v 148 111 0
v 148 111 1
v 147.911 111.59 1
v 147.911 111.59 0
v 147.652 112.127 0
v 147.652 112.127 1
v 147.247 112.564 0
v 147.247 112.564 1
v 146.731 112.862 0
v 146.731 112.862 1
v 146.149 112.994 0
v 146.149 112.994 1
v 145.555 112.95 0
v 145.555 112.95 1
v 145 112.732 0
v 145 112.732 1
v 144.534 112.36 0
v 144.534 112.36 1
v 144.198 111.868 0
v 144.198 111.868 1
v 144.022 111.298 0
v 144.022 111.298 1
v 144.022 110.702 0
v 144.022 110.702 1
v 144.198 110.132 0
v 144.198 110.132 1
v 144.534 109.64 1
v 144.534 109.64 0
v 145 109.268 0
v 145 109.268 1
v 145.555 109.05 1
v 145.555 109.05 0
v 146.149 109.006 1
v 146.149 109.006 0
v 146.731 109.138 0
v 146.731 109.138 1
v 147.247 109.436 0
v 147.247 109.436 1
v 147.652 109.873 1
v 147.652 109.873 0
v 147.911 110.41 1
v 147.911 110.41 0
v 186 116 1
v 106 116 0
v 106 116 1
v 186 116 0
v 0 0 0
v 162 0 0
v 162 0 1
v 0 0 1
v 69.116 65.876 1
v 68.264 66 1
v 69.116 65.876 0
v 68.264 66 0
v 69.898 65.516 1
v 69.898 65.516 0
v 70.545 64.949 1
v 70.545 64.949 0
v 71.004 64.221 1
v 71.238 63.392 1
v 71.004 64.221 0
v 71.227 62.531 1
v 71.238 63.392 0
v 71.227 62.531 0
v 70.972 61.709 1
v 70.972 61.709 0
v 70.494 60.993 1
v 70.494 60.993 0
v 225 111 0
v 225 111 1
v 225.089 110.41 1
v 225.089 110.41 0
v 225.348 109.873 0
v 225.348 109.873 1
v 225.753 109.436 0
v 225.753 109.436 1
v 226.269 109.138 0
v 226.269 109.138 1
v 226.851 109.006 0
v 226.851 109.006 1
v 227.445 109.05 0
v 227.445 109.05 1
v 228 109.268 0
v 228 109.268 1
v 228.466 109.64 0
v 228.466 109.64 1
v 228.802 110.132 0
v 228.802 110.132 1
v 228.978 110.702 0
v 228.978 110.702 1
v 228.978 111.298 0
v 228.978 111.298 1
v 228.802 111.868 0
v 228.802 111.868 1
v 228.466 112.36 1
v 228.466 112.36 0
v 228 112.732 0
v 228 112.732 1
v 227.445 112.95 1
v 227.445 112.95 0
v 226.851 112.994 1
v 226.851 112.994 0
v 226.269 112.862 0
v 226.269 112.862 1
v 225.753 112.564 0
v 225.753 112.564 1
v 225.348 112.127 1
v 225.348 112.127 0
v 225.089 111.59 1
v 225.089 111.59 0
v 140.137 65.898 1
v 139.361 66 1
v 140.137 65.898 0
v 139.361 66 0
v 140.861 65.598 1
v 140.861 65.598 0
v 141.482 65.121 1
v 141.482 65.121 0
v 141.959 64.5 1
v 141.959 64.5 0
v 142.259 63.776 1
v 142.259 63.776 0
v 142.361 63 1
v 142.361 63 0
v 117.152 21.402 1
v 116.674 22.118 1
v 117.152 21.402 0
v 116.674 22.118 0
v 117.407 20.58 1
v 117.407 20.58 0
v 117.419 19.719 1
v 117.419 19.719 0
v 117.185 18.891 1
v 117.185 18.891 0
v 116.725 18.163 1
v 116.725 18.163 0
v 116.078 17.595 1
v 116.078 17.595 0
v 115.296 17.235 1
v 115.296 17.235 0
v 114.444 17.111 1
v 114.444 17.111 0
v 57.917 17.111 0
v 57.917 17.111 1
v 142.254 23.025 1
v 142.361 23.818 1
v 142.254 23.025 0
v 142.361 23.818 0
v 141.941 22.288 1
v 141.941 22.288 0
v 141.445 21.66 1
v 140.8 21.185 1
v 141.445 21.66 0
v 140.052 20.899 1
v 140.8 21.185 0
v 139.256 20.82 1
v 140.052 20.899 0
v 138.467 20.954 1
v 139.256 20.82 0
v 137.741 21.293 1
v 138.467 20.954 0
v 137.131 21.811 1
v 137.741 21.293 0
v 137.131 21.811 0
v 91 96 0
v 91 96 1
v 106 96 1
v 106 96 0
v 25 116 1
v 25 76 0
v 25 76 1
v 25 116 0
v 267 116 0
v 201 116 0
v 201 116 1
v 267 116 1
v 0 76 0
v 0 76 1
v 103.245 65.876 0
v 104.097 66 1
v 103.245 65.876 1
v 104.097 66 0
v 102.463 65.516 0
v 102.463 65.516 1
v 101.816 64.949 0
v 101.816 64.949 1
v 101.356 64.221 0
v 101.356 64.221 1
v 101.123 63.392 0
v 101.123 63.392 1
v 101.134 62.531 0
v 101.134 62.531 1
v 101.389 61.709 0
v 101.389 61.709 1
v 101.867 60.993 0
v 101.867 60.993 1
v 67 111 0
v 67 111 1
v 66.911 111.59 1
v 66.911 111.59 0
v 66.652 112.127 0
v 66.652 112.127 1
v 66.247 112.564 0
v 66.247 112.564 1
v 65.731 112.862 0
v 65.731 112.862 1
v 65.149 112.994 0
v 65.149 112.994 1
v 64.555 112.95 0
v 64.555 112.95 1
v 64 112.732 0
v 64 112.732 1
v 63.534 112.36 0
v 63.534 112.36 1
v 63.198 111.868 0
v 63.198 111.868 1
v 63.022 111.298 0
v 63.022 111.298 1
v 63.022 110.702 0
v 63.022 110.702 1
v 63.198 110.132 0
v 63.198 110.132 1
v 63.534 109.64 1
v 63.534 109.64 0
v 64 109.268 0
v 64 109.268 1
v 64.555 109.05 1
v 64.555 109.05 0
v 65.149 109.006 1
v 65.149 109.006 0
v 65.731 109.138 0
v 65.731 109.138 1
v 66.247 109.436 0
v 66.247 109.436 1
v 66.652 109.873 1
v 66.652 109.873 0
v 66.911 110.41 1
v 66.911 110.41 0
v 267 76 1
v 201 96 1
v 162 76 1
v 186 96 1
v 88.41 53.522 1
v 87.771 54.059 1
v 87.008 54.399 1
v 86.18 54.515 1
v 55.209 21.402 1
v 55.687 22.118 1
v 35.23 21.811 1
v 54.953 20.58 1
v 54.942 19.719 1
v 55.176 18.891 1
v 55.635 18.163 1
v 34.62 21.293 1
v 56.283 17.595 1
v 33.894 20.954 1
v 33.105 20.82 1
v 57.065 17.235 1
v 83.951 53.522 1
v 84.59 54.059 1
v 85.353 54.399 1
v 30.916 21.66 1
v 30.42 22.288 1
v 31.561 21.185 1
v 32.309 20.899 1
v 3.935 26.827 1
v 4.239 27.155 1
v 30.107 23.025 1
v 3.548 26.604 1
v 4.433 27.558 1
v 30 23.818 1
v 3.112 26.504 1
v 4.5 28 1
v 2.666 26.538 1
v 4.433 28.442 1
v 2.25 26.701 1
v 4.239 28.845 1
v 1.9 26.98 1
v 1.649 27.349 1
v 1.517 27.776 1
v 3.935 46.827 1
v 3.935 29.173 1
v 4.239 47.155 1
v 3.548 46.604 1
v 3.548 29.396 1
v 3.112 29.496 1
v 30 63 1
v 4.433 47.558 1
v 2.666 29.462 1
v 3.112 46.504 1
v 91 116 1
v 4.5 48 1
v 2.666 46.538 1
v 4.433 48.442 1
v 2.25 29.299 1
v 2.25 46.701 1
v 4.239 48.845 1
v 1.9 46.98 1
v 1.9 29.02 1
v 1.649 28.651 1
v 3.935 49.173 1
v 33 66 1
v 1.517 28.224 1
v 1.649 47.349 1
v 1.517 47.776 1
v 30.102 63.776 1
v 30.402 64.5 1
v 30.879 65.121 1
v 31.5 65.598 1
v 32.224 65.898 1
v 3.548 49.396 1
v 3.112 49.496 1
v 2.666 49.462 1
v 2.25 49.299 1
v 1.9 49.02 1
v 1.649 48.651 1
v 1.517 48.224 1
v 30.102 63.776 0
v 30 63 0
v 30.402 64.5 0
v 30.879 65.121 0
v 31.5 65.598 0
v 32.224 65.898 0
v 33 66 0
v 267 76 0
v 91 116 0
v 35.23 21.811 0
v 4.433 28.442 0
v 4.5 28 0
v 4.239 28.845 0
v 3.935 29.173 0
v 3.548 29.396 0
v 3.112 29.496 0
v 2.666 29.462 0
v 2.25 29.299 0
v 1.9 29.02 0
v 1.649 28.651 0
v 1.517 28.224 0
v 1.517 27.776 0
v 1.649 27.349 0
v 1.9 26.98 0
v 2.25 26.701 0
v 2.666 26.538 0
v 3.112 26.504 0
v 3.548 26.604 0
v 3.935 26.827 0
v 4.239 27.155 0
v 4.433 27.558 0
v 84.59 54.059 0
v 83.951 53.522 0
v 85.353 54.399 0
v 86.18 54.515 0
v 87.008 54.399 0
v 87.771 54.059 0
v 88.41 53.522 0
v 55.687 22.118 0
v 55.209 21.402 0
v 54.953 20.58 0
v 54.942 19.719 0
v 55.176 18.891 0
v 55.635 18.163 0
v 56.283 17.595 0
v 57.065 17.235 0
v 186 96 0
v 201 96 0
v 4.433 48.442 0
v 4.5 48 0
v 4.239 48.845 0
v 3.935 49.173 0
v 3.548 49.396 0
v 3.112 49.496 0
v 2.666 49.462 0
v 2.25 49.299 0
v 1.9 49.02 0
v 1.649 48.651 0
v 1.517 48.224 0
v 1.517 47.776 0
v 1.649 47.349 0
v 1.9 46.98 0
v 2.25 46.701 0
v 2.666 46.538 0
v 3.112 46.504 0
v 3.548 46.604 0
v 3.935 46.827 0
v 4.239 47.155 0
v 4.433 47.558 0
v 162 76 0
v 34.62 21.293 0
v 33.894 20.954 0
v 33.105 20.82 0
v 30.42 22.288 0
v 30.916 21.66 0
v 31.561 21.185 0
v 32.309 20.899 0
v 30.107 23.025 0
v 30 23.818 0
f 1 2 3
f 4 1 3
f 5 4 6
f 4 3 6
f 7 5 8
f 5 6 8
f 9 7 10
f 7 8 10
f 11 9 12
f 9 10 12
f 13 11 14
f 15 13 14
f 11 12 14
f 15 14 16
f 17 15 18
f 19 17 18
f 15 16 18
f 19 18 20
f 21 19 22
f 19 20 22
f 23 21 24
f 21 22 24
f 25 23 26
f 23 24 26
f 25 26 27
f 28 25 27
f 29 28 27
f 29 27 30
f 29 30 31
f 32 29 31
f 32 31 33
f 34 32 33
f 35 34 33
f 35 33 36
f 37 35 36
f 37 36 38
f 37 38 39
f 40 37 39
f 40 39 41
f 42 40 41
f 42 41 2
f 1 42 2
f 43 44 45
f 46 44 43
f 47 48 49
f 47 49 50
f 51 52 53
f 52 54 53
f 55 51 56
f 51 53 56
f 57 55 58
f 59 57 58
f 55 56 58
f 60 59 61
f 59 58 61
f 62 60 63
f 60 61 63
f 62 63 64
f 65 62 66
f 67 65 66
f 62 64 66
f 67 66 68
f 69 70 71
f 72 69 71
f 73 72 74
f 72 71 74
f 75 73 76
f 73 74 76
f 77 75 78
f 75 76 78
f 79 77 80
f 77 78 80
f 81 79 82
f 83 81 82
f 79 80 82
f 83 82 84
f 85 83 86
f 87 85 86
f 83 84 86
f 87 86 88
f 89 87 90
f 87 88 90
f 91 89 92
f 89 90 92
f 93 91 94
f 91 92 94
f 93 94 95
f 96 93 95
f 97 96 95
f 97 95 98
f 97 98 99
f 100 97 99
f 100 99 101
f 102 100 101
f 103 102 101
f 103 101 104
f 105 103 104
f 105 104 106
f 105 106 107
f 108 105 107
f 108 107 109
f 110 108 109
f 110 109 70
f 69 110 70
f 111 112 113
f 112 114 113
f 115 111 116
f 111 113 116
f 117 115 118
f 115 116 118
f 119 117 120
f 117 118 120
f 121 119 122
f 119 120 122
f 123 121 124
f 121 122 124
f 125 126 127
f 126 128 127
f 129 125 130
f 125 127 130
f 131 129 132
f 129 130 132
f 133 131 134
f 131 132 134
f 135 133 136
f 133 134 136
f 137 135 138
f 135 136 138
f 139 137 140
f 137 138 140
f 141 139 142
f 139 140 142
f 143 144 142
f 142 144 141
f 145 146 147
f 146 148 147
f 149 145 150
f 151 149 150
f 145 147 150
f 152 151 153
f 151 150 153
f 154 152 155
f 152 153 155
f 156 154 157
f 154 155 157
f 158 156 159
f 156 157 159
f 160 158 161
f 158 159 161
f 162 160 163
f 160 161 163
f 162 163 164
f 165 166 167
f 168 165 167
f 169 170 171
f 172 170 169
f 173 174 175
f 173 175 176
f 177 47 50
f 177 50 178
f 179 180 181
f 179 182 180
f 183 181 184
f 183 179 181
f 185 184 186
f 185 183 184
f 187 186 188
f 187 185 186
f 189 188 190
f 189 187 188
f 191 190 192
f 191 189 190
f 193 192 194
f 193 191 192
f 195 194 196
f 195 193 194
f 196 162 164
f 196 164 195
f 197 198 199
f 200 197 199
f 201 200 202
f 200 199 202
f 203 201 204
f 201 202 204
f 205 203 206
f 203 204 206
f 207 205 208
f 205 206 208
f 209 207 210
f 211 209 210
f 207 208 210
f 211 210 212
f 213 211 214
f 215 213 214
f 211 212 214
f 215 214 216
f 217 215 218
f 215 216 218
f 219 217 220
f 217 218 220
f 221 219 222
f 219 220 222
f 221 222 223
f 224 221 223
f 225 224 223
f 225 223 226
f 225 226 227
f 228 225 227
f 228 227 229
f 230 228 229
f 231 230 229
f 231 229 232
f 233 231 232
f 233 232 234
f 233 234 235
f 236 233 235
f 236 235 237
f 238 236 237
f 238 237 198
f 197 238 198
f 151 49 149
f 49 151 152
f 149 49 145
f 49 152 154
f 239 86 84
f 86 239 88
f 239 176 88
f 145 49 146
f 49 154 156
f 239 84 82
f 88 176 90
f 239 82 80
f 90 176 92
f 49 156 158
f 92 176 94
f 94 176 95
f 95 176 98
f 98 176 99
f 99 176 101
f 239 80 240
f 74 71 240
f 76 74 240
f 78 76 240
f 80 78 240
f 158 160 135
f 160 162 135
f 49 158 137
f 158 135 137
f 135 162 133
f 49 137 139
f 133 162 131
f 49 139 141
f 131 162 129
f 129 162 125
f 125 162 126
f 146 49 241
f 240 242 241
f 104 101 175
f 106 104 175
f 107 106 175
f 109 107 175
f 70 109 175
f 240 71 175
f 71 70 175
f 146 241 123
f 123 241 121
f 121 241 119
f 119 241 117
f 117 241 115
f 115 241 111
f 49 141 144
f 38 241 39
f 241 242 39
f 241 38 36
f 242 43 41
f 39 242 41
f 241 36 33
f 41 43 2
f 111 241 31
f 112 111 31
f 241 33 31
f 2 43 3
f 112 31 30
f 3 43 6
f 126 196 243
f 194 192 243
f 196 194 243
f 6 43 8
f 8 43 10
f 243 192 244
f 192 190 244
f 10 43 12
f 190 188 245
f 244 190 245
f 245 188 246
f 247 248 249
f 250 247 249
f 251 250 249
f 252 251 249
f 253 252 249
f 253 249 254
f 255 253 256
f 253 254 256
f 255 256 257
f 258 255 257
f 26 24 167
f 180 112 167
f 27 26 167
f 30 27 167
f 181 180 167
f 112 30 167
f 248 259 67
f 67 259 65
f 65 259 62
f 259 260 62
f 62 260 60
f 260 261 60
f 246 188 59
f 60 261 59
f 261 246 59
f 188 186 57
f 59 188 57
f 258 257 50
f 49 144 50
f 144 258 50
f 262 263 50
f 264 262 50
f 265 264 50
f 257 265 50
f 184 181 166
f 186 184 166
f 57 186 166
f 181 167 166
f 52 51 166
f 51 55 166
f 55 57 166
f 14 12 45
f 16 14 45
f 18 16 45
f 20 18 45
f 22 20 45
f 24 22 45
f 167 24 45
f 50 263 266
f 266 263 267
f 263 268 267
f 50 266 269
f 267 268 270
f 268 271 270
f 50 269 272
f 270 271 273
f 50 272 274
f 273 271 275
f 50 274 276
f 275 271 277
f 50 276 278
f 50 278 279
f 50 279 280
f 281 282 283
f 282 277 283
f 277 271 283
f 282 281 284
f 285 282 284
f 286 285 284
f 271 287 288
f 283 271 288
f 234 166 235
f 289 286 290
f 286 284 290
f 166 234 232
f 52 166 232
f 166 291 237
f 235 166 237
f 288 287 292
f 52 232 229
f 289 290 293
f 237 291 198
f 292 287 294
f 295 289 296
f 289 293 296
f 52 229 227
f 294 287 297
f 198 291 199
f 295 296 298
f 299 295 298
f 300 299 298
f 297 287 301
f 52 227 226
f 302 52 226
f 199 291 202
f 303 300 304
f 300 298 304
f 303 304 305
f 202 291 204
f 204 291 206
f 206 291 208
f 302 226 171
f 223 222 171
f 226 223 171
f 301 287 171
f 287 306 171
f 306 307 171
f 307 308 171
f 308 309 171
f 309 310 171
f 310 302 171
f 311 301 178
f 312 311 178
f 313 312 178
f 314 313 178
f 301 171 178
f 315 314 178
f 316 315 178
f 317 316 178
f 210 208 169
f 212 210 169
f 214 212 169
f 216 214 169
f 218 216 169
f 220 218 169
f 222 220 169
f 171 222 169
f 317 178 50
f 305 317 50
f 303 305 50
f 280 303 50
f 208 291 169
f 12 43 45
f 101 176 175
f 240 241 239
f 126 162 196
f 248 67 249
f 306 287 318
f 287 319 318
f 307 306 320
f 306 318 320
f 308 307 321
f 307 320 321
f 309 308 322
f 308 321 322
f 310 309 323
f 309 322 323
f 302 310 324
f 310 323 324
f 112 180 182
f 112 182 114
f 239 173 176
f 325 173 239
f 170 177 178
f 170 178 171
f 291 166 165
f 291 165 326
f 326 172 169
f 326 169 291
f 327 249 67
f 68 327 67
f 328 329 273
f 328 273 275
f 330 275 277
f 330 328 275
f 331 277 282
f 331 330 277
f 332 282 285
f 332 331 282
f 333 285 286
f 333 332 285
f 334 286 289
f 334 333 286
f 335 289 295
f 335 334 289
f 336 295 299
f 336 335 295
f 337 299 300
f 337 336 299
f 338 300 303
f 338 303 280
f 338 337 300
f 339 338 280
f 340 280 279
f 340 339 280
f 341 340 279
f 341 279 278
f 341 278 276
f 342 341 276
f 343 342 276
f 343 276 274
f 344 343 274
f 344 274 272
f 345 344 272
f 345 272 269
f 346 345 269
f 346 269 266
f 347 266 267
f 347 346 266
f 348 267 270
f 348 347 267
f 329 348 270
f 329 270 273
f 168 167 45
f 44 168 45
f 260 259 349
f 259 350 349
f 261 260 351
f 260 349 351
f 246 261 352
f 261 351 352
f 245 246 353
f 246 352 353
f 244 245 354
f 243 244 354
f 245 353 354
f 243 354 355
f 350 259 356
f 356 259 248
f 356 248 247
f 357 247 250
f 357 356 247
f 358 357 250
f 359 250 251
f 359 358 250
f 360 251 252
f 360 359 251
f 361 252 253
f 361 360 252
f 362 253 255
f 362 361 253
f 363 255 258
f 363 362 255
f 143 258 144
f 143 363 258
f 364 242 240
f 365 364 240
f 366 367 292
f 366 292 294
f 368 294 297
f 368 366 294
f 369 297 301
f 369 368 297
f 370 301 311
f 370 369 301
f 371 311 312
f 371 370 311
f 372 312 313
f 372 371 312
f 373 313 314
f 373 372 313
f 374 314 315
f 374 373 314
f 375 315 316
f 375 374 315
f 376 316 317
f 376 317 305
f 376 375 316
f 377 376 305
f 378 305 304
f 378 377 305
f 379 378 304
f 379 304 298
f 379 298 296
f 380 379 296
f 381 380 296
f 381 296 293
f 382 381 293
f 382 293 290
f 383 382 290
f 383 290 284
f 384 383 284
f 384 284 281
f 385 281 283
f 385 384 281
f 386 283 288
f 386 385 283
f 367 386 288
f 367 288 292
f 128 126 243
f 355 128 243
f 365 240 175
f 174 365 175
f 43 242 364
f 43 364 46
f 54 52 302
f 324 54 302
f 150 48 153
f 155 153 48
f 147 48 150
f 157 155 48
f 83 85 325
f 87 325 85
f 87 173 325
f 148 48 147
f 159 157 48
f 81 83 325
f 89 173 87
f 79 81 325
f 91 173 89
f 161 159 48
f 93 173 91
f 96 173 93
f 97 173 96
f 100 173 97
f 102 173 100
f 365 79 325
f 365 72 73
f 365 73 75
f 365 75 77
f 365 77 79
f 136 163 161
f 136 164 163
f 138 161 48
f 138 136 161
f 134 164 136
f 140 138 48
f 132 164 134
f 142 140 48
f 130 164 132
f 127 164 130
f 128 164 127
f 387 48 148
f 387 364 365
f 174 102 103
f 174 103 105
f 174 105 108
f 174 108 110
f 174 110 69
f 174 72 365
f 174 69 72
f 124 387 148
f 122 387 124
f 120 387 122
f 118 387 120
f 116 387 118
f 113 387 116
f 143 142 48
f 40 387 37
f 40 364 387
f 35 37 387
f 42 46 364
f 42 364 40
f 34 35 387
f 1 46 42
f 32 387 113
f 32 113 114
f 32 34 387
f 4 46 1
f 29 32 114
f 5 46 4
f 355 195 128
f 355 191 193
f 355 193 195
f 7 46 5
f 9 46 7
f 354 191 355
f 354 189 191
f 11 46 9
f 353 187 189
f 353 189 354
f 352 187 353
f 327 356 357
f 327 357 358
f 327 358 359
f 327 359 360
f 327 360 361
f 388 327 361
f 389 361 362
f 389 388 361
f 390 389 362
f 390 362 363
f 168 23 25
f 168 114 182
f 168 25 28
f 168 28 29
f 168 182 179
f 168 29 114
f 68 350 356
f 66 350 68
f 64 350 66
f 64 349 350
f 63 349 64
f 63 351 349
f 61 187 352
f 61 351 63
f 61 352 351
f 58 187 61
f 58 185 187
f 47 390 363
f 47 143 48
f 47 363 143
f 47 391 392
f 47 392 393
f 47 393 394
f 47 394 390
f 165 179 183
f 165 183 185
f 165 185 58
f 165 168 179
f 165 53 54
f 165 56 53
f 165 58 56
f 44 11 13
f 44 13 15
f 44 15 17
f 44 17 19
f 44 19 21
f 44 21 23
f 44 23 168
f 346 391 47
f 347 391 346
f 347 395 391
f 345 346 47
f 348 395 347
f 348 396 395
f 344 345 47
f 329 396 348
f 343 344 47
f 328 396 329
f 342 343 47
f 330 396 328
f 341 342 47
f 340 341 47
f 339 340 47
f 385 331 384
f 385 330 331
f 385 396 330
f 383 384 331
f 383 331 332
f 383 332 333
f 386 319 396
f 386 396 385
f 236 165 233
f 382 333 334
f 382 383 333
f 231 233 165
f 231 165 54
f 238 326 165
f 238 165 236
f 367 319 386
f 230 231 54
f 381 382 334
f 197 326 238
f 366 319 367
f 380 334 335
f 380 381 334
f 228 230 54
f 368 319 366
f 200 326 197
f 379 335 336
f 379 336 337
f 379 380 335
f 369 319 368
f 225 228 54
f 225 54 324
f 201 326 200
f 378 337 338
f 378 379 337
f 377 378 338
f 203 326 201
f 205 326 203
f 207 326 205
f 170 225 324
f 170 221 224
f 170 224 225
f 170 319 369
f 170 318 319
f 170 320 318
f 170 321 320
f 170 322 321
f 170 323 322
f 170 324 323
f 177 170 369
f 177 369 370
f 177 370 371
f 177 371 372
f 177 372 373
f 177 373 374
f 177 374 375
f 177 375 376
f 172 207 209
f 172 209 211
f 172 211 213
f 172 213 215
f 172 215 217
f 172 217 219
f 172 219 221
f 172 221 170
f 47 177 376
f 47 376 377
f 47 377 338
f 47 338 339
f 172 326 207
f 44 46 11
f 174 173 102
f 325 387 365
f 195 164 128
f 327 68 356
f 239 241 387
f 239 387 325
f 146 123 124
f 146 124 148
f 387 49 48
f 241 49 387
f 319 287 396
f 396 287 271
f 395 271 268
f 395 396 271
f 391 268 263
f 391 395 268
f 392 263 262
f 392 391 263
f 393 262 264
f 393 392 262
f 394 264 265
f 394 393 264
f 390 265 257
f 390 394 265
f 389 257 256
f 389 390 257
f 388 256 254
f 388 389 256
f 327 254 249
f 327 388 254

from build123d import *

# Parameters (mm, degrees)
SKETCH_1_R          = 1.5
EXTRUDE_1_DEPTH     = 1
SKETCH_2_R          = 2
SKETCH_2_W          = 15
SKETCH_2_H          = 20
CUT_EXTRUDE_1_DEPTH = 315.198981539
SKETCH_3_W          = 130
SKETCH_3_H          = 76
CUT_EXTRUDE_2_DEPTH = 315.198981539
CUT_EXTRUDE_3_REACH = 293.112
FILLET_1_R          = 3


with BuildPart() as part:
    # 草图1 → 凸台-拉伸1 (new body)
    with BuildSketch(Plane.XY):
        Polygon((0, 0), (0, 76), (25, 76), (25, 116), (267, 116), (267, 76), (292, 76), (292, 0), align=None)
        with Locations((3, 48)):
            Circle(SKETCH_1_R, mode=Mode.SUBTRACT)
        with Locations((3, 28)):
            Circle(SKETCH_1_R, mode=Mode.SUBTRACT)
        with Locations(Location((289, 28, 0), (0, 0, 180))):
            Circle(SKETCH_1_R, mode=Mode.SUBTRACT)
        with Locations(Location((289, 48, 0), (0, 0, 180))):
            Circle(SKETCH_1_R, mode=Mode.SUBTRACT)
    extrude(amount=EXTRUDE_1_DEPTH)

    # 草图2 → 切除-拉伸1 (cut, through all)
    with BuildSketch(Plane.XY.offset(1)):
        with Locations((65, 111)):
            Circle(SKETCH_2_R)
        with Locations(Location((227, 111, 0), (0, 0, 180))):
            Circle(SKETCH_2_R)
        with Locations((146, 111)):
            Circle(SKETCH_2_R)
        with Locations((193.5, 106)):
            Rectangle(SKETCH_2_W, SKETCH_2_H)
        with Locations((98.5, 106)):
            Rectangle(SKETCH_2_W, SKETCH_2_H)
    extrude(amount=-CUT_EXTRUDE_1_DEPTH, mode=Mode.SUBTRACT)

    # 草图3 → 切除-拉伸2 (cut, through all)
    with BuildSketch(Plane.XY.offset(1)):
        with Locations((227, 38)):
            Rectangle(SKETCH_3_W, SKETCH_3_H)
    extrude(amount=-CUT_EXTRUDE_2_DEPTH, mode=Mode.SUBTRACT)

    # 草图4 → 切除-拉伸3 (cut, up to next)
    with BuildSketch(Plane.XY.offset(1), mode=Mode.PRIVATE) as cut_extrude_3_sk1:
        Polygon((30, 16), (75, 66), (30, 66), align=None)
    cut_extrude_3_tool1 = extrude(cut_extrude_3_sk1.sketch, amount=-CUT_EXTRUDE_3_REACH, mode=Mode.PRIVATE) & part.part
    # 草图4 → 切除-拉伸3 (cut, up to next)
    with BuildSketch(Plane.XY.offset(1), mode=Mode.PRIVATE) as cut_extrude_3_sk2:
        Polygon((86.180436071, 17.111111111), (86.180436071, 56), (51.180436071, 17.111111111), align=None)
    cut_extrude_3_tool2 = extrude(cut_extrude_3_sk2.sketch, amount=-CUT_EXTRUDE_3_REACH, mode=Mode.PRIVATE) & part.part
    # 草图4 → 切除-拉伸3 (cut, up to next)
    with BuildSketch(Plane.XY.offset(1), mode=Mode.PRIVATE) as cut_extrude_3_sk3:
        Polygon((121.180436071, 17.111111111), (86.180436071, 56), (86.180436071, 17.111111111), align=None)
    cut_extrude_3_tool3 = extrude(cut_extrude_3_sk3.sketch, amount=-CUT_EXTRUDE_3_REACH, mode=Mode.PRIVATE) & part.part
    # 草图4 → 切除-拉伸3 (cut, up to next)
    with BuildSketch(Plane.XY.offset(1), mode=Mode.PRIVATE) as cut_extrude_3_sk4:
        Polygon((97.360872141, 66), (142.360872141, 66), (142.360872141, 16), align=None)
    cut_extrude_3_tool4 = extrude(cut_extrude_3_sk4.sketch, amount=-CUT_EXTRUDE_3_REACH, mode=Mode.PRIVATE) & part.part
    add(cut_extrude_3_tool1.solids().sort_by_distance((45, 49.333333, 1))[0], mode=Mode.SUBTRACT)
    add(cut_extrude_3_tool2.solids().sort_by_distance((74.513769, 30.074074, 1))[0], mode=Mode.SUBTRACT)
    add(cut_extrude_3_tool3.solids().sort_by_distance((97.847103, 30.074074, 1))[0], mode=Mode.SUBTRACT)
    add(cut_extrude_3_tool4.solids().sort_by_distance((127.360872, 49.333333, 1))[0], mode=Mode.SUBTRACT)

    # 圆角1
    fillet_1_edges = [part.edges().sort_by_distance(p)[0] for p in [
        (121.180436071, 17.111111111, 0.5),
        (51.180436071, 17.111111111, 0.5),
        (86.180436071, 56, 0.5),
        (97.360872141, 66, 0.5),
        (142.360872141, 66, 0.5),
        (142.360872141, 16, 0.5),
        (75, 66, 0.5),
        (30, 16, 0.5),
        (30, 66, 0.5),
    ]]
    fillet(fillet_1_edges, radius=FILLET_1_R)


solid = part.part
